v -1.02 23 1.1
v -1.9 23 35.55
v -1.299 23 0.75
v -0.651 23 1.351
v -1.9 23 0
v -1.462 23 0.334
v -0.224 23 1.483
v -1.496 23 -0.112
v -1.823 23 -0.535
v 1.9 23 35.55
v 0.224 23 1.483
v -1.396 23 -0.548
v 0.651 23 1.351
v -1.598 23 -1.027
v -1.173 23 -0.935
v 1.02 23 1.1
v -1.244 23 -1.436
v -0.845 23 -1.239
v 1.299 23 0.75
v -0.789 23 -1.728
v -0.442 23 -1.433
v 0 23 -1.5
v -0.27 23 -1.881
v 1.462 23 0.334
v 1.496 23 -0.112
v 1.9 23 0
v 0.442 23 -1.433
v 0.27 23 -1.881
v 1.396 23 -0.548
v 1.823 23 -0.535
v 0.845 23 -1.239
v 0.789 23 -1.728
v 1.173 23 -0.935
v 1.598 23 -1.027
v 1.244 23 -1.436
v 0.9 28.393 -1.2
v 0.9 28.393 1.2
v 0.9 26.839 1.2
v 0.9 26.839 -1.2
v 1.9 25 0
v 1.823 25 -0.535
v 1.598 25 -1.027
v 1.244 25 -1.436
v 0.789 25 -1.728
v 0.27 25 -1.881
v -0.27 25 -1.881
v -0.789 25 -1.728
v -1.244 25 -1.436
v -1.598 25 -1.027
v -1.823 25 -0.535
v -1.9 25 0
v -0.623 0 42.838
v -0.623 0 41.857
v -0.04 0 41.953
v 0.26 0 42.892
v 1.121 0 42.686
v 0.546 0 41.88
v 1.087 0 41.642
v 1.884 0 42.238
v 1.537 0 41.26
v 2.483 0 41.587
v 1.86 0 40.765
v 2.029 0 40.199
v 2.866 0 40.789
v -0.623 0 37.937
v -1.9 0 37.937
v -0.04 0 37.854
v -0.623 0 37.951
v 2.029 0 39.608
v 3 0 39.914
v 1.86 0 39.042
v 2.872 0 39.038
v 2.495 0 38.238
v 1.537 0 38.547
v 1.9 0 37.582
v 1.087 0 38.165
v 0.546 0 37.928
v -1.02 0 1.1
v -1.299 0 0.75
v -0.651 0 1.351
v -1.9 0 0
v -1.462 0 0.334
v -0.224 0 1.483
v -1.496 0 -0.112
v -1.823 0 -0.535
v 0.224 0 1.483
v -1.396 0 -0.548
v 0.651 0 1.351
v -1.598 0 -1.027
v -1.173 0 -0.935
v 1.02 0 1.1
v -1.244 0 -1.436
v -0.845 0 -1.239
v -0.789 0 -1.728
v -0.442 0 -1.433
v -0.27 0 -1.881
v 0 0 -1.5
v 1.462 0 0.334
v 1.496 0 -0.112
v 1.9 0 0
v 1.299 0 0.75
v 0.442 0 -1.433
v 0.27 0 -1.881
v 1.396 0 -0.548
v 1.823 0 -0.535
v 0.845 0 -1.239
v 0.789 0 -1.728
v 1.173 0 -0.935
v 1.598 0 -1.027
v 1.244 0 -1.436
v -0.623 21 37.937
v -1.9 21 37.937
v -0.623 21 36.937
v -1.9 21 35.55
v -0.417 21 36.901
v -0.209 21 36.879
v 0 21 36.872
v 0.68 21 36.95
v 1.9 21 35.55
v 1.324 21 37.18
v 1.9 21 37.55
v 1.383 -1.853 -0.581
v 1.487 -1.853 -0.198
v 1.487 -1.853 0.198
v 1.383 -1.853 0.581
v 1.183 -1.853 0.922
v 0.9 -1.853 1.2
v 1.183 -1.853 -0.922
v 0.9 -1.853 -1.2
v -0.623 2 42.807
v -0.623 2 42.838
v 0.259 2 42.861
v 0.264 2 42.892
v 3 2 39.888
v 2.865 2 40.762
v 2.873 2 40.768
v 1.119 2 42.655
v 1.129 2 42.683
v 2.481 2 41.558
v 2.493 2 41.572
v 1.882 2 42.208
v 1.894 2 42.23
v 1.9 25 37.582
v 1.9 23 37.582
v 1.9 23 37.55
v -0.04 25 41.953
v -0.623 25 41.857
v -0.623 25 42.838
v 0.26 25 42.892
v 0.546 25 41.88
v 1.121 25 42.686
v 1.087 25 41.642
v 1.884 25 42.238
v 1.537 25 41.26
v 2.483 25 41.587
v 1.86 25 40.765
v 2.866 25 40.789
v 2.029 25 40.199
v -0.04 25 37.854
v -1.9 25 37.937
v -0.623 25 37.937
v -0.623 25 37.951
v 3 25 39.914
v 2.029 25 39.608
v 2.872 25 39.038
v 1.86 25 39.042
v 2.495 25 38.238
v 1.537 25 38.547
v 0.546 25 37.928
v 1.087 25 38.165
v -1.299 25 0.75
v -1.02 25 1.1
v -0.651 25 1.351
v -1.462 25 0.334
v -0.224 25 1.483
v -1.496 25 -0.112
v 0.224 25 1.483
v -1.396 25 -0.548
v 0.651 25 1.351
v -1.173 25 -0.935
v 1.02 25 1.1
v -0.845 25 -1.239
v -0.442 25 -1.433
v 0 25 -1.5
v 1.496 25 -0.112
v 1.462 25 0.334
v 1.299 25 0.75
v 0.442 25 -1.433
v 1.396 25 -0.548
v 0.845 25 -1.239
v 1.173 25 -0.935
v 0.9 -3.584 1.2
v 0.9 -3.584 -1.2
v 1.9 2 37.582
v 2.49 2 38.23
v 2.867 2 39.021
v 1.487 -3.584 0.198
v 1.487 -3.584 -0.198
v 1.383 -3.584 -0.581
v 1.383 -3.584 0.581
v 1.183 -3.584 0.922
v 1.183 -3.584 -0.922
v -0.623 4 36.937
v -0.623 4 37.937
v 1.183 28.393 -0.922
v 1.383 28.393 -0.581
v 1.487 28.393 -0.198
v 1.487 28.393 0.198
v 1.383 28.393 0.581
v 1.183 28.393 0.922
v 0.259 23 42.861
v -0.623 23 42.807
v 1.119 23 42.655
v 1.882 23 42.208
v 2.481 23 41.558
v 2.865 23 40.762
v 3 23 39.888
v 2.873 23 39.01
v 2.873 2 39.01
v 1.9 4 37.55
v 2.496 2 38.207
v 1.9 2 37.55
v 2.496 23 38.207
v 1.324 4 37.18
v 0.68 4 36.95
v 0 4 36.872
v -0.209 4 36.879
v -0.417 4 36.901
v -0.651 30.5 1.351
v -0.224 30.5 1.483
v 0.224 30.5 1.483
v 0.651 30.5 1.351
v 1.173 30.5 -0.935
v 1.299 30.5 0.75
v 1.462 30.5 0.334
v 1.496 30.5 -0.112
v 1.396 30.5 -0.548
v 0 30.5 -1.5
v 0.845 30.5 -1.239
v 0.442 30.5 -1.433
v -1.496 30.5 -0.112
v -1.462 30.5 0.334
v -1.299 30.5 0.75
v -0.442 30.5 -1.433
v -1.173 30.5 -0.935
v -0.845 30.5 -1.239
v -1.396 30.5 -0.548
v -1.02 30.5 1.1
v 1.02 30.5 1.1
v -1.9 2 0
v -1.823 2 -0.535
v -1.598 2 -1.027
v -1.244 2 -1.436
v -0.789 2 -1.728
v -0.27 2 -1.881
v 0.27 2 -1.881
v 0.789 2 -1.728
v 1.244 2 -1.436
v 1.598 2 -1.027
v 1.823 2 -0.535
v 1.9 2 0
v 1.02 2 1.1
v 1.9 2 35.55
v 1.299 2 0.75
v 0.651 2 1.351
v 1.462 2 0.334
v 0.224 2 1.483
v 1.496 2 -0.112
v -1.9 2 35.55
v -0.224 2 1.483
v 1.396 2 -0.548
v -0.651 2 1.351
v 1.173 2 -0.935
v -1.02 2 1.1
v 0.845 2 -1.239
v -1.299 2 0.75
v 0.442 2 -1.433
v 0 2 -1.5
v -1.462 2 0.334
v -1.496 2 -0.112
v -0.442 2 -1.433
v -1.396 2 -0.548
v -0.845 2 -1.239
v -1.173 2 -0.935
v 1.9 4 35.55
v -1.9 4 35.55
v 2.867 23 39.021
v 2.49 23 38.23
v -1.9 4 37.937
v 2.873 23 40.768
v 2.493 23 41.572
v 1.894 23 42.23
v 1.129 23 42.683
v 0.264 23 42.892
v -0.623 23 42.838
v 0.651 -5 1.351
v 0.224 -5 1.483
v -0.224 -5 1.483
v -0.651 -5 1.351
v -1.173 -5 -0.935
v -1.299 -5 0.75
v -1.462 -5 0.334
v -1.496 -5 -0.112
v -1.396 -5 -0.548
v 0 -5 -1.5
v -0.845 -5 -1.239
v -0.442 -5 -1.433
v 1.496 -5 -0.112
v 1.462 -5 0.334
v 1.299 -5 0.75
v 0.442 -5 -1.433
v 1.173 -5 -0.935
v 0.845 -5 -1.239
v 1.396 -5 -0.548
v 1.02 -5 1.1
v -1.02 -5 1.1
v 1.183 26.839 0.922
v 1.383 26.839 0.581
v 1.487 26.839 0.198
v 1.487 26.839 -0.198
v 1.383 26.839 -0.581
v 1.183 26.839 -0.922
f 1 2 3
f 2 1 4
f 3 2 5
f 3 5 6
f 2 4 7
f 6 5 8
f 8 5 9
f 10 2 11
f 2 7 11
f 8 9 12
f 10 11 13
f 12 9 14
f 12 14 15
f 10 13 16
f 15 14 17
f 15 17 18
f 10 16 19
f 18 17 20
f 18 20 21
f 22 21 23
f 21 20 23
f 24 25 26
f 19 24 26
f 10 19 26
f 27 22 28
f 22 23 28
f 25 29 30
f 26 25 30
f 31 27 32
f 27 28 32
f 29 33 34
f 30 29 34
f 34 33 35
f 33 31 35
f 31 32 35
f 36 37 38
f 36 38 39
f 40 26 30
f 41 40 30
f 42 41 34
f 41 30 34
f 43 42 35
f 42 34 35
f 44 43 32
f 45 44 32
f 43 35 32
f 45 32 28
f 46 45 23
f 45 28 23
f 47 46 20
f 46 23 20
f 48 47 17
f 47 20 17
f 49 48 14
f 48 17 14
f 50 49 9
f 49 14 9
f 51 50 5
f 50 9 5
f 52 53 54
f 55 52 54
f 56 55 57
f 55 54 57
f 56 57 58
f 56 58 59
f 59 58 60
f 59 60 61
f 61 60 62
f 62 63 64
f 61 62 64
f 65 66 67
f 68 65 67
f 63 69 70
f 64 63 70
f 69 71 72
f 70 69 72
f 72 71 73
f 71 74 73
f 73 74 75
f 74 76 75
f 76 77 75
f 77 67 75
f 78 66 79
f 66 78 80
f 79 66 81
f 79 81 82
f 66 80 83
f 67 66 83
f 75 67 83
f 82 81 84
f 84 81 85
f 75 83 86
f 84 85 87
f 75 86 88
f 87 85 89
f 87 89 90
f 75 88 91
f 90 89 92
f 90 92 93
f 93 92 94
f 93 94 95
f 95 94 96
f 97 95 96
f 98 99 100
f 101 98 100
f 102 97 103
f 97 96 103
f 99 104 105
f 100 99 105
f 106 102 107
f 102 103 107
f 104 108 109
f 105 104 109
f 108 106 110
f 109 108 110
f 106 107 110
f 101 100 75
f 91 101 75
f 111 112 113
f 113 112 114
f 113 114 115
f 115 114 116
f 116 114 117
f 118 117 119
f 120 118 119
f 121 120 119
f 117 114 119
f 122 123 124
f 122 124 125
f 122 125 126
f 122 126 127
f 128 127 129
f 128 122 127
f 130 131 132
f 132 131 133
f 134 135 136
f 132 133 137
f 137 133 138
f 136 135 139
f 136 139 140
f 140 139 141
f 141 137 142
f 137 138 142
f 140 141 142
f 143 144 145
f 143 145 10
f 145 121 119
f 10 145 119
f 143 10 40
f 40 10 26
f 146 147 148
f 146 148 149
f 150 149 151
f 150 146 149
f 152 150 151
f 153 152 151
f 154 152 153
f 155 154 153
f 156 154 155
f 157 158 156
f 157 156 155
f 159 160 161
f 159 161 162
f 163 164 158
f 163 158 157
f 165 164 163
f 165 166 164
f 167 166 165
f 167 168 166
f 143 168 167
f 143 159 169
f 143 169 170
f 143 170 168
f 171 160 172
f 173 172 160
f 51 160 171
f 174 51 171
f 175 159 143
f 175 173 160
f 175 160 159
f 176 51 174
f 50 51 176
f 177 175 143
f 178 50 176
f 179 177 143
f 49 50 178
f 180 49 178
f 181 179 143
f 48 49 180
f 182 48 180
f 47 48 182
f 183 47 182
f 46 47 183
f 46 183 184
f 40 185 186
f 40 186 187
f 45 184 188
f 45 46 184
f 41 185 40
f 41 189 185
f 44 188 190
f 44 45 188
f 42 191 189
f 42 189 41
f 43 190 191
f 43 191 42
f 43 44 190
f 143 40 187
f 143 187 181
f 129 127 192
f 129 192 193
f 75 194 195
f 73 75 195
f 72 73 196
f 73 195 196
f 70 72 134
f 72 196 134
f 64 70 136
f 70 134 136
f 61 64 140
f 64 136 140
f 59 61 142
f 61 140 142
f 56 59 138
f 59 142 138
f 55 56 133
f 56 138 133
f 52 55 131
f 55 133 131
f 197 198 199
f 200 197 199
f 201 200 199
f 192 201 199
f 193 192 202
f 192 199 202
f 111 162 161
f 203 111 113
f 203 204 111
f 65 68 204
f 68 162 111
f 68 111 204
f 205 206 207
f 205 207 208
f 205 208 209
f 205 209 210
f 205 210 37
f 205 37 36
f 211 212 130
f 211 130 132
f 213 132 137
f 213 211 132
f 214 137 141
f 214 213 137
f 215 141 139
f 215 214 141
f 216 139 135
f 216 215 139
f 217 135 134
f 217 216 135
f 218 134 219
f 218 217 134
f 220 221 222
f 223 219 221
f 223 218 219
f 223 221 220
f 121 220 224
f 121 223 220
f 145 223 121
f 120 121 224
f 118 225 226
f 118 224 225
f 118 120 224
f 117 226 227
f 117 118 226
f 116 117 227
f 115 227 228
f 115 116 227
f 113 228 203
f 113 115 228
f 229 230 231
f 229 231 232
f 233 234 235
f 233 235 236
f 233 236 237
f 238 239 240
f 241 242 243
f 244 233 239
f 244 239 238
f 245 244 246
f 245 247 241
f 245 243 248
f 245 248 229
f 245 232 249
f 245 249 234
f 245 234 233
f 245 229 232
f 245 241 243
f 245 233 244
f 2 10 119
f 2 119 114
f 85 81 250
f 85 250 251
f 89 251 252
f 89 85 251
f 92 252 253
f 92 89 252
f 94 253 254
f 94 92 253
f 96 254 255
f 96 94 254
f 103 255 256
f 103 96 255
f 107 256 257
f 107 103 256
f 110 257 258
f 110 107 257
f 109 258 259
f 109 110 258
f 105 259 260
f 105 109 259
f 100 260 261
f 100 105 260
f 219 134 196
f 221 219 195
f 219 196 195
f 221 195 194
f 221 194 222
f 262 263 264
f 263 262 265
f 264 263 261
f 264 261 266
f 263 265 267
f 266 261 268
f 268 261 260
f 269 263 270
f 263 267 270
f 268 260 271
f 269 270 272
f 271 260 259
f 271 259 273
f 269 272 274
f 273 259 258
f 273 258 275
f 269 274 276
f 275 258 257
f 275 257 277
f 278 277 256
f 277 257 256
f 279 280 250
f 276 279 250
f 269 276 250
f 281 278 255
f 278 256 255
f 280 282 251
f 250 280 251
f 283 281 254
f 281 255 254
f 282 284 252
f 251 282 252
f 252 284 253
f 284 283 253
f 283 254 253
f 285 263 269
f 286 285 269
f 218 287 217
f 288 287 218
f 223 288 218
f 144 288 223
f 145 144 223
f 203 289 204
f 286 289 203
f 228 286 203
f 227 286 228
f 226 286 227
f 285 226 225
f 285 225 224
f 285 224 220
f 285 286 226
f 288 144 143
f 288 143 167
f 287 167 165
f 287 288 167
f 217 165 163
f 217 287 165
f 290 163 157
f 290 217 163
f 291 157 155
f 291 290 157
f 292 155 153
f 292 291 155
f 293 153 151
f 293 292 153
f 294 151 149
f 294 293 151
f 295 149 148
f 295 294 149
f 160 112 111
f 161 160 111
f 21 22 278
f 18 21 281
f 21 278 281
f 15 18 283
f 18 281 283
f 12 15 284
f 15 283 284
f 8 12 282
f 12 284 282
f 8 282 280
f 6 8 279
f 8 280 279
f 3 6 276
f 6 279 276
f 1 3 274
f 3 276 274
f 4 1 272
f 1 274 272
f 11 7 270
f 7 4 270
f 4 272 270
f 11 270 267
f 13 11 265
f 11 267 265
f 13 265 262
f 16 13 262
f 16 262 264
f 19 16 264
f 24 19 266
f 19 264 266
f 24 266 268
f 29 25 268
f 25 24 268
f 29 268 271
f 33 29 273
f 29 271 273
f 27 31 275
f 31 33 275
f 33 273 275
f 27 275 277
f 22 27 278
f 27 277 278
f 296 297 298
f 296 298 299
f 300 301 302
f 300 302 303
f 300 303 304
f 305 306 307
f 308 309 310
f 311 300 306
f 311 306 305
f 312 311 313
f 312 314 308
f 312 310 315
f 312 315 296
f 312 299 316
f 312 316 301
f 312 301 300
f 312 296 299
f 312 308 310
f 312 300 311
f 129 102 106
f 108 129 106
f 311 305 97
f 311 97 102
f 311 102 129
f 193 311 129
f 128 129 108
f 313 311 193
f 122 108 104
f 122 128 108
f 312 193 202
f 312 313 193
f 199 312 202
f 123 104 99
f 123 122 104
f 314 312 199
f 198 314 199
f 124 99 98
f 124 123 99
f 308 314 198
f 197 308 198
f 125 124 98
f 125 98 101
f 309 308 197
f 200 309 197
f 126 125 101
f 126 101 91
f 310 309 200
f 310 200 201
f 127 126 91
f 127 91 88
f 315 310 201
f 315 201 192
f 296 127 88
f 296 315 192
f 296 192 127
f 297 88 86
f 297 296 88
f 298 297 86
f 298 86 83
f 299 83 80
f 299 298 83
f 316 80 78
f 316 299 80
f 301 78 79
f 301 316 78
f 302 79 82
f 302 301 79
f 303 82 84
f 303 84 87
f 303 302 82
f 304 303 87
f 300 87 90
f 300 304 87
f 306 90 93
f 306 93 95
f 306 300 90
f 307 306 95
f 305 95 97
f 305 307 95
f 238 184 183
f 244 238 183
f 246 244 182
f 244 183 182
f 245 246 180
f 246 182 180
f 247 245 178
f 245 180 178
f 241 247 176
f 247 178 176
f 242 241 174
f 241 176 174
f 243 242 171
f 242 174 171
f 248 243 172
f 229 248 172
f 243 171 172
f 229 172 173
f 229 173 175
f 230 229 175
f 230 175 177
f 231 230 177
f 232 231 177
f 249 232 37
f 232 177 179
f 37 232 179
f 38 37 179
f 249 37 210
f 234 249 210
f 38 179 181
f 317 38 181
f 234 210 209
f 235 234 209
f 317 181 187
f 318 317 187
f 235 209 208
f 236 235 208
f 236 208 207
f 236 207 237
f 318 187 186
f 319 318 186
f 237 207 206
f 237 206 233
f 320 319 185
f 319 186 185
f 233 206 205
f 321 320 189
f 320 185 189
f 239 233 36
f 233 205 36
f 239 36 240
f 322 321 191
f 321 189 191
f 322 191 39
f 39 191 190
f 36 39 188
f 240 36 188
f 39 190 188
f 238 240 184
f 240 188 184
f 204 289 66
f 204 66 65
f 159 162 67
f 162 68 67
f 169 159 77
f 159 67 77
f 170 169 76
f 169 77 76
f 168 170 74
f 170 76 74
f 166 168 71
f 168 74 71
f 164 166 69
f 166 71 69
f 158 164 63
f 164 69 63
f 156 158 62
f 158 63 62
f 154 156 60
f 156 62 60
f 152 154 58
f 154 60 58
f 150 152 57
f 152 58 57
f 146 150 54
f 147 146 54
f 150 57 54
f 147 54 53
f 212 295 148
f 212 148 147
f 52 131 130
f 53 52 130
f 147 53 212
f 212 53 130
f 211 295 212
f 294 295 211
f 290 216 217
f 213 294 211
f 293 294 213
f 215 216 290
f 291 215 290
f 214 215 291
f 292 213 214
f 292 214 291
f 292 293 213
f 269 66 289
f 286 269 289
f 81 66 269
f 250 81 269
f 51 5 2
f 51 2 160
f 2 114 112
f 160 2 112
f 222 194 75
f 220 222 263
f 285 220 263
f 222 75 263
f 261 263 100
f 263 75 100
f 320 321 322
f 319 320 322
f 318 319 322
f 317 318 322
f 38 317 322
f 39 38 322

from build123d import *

# Parameters (mm, degrees)
EXTRUDE_1_DEPTH     = 2
SKETCH_2_R          = 3
EXTRUDE_2_DEPTH     = 10.5
SKETCH_3_R          = 2.05
CUT_EXTRUDE_1_DEPTH = 12.5
EXTRUDE_3_DEPTH     = 2
SKETCH_5_R          = 3
SKETCH_5_R_2        = 2.05
EXTRUDE_4_DEPTH     = 2
SKETCH_8_W          = 2.95616439
SKETCH_8_H          = 6.387063899
CUT_EXTRUDE_3_DEPTH = 12.5
SKETCH_9_W          = 1.27668382
SKETCH_9_H          = 4
EXTRUDE_5_DEPTH     = 1
SKETCH_10_R         = 1.5
EXTRUDE_6_DEPTH     = 10.5
MIRROR_START        = 23
MIRROR_11_DEPTH     = 2
SKETCH_11_R         = 1.5
EXTRUDE_7_DEPTH     = 18
EXTRUDE_START       = 5
SKETCH_12_R         = 1.5
EXTRUDE_8_DEPTH     = 5
SKETCH_13_W         = 5.222026014
SKETCH_13_H         = 1.730667712
SKETCH_13_H_2       = 1.553374839
CUT_EXTRUDE_4_DEPTH = 1


# Read off the part's stored shape, not the designer's step: 镜向11
with BuildPart() as part:
    # 草图1 → 凸台-拉伸1 (new body)
    with BuildSketch(Plane(origin=(0, 0, 0), x_dir=(1, 0, 0), z_dir=(0, 1, 0))):
        with BuildLine():
            Line((1.9, 0), (1.9, -40.018240839))
            ThreePointArc((1.9, -40.018240839), (0, -41.918240839), (-1.9, -40.018240839))
            Line((-1.9, -40.018240839), (-1.9, 0))
            ThreePointArc((-1.9, 0), (0, 1.9), (1.9, 0))
        make_face()
    extrude(amount=EXTRUDE_1_DEPTH)

    # 草图2 → 凸台-拉伸2 (add)
    with BuildSketch(Plane(origin=(0, 2, 0), x_dir=(1, 0, 0), z_dir=(0, 1, 0))):
        with Locations(Location((0, -39.871991717, 0), (0, 0, 129.296480239))):
            Circle(SKETCH_2_R)
    extrude_2 = extrude(amount=EXTRUDE_2_DEPTH)

    # 草图3 → 切除-拉伸1 (cut)
    with BuildSketch(Plane(origin=(0, 12.5, 0), x_dir=(1, 0, 0), z_dir=(0, 1, 0))):
        with Locations(Location((0, -39.903679128, 0), (0, 0, 270))):
            Circle(SKETCH_3_R)
    cut_extrude_1 = extrude(amount=-CUT_EXTRUDE_1_DEPTH, mode=Mode.SUBTRACT)

    # 草图4 → 凸台-拉伸3 (add)
    with BuildSketch(Plane(origin=(0, 2, 0), x_dir=(1, 0, 0), z_dir=(0, 1, 0))):
        with BuildLine():
            Line((-1.9, -35.550354364), (-1.9, -37.550354364))
            ThreePointArc((-1.9, -37.550354364), (-1.008733845, -37.046667659), (0, -36.871991717))
            ThreePointArc((0, -36.871991717), (1.008733845, -37.046667659), (1.9, -37.550354364))
            Line((1.9, -37.550354364), (1.9, -35.550354364))
            Line((1.9, -35.550354364), (-1.9, -35.550354364))
        make_face()
    extrude_3 = extrude(amount=EXTRUDE_3_DEPTH)

    # 草图5 → 凸台-拉伸4 (add)
    with BuildSketch(Plane.XZ.offset(-2)):
        with Locations((0, 39.903679128)):
            Circle(SKETCH_5_R)
        with Locations(Location((0, 39.903679128, 0), (0, 0, 90))):
            Circle(SKETCH_5_R_2, mode=Mode.SUBTRACT)
    extrude_4 = extrude(amount=EXTRUDE_4_DEPTH)

    # 草图8 → 切除-拉伸3 (cut)
    with BuildSketch(Plane(origin=(0, 12.5, 0), x_dir=(1, 0, 0), z_dir=(0, 1, 0))):
        with Locations((-2.101398375, -40.130991858)):
            Rectangle(SKETCH_8_W, SKETCH_8_H)
    cut_extrude_3 = extrude(amount=-CUT_EXTRUDE_3_DEPTH, mode=Mode.SUBTRACT)

    # 草图9 → 凸台-拉伸5 (add)
    with BuildSketch(Plane.XY.offset(36.937459908)):
        with Locations((-1.26165809, 2)):
            Rectangle(SKETCH_9_W, SKETCH_9_H)
    extrude_5 = extrude(amount=EXTRUDE_5_DEPTH)

    # 草图10 → 凸台-拉伸6 (add)
    with BuildSketch(Plane(origin=(0, 2, 0), x_dir=(1, 0, 0), z_dir=(0, 1, 0))):
        with Locations(Location((0, 0, 0), (0, 0, 90))):
            Circle(SKETCH_10_R)
    extrude(amount=EXTRUDE_6_DEPTH)

    # 镜向10: 凸台-拉伸2, 切除-拉伸1, 凸台-拉伸3, 凸台-拉伸4, 切除-拉伸3, 凸台-拉伸5 across plane
    add(extrude_2.mirror(Plane.ZX.offset(12.5)))
    add(cut_extrude_1.mirror(Plane.ZX.offset(12.5)), mode=Mode.SUBTRACT)
    add(extrude_3.mirror(Plane.ZX.offset(12.5)))
    add(extrude_4.mirror(Plane.ZX.offset(12.5)))
    add(cut_extrude_3.mirror(Plane.ZX.offset(12.5)), mode=Mode.SUBTRACT)
    add(extrude_5.mirror(Plane.ZX.offset(12.5)))

    # 镜向11 outline → 镜向11 (add)
    with BuildSketch(Plane(origin=(0, 0, 0), x_dir=(1, 0, 0), z_dir=(0, 1, 0)).offset(MIRROR_START)):
        with BuildLine():
            ThreePointArc((1.9, 0), (0, 1.9), (-1.9, 0))
            Line((-1.9, 0), (-1.9, -36.937459908))
            Line((-1.9, -36.937459908), (-0.62331618, -36.937459908))
            Line((-0.62331618, -36.937459908), (-0.62331618, -36.969147319))
            ThreePointArc((-0.62331618, -36.969147319), (0.708089188, -36.988441625), (1.9, -37.582041775))
            Line((1.9, -37.582041775), (1.9, 0))
        make_face()
    extrude(amount=MIRROR_11_DEPTH)

    # 草图11 → 凸台-拉伸7 (add)
    with BuildSketch(Plane(origin=(0, 12.5, 0), x_dir=(1, 0, 0), z_dir=(0, 1, 0))):
        with Locations(Location((0, 0, 0), (0, 0, 90))):
            Circle(SKETCH_11_R)
    extrude(amount=EXTRUDE_7_DEPTH)

    # 草图12 → 凸台-拉伸8 (add)
    with BuildSketch(Plane.XZ.offset(EXTRUDE_START)):
        with Locations(Location((0, 0, 0), (0, 0, 270))):
            Circle(SKETCH_12_R)
    extrude(amount=-EXTRUDE_8_DEPTH)

    # 草图13 → 切除-拉伸4 (cut)
    with BuildSketch(Plane(origin=(1.9, 0, 0), x_dir=(0, 0, -1), z_dir=(1, 0, 0))):
        with Locations((0.263368909, -2.718253364)):
            Rectangle(SKETCH_13_W, SKETCH_13_H)
        with Locations((0.263368909, 27.61617656)):
            Rectangle(SKETCH_13_W, SKETCH_13_H_2)
    extrude(amount=-CUT_EXTRUDE_4_DEPTH, mode=Mode.SUBTRACT)


solid = part.part
